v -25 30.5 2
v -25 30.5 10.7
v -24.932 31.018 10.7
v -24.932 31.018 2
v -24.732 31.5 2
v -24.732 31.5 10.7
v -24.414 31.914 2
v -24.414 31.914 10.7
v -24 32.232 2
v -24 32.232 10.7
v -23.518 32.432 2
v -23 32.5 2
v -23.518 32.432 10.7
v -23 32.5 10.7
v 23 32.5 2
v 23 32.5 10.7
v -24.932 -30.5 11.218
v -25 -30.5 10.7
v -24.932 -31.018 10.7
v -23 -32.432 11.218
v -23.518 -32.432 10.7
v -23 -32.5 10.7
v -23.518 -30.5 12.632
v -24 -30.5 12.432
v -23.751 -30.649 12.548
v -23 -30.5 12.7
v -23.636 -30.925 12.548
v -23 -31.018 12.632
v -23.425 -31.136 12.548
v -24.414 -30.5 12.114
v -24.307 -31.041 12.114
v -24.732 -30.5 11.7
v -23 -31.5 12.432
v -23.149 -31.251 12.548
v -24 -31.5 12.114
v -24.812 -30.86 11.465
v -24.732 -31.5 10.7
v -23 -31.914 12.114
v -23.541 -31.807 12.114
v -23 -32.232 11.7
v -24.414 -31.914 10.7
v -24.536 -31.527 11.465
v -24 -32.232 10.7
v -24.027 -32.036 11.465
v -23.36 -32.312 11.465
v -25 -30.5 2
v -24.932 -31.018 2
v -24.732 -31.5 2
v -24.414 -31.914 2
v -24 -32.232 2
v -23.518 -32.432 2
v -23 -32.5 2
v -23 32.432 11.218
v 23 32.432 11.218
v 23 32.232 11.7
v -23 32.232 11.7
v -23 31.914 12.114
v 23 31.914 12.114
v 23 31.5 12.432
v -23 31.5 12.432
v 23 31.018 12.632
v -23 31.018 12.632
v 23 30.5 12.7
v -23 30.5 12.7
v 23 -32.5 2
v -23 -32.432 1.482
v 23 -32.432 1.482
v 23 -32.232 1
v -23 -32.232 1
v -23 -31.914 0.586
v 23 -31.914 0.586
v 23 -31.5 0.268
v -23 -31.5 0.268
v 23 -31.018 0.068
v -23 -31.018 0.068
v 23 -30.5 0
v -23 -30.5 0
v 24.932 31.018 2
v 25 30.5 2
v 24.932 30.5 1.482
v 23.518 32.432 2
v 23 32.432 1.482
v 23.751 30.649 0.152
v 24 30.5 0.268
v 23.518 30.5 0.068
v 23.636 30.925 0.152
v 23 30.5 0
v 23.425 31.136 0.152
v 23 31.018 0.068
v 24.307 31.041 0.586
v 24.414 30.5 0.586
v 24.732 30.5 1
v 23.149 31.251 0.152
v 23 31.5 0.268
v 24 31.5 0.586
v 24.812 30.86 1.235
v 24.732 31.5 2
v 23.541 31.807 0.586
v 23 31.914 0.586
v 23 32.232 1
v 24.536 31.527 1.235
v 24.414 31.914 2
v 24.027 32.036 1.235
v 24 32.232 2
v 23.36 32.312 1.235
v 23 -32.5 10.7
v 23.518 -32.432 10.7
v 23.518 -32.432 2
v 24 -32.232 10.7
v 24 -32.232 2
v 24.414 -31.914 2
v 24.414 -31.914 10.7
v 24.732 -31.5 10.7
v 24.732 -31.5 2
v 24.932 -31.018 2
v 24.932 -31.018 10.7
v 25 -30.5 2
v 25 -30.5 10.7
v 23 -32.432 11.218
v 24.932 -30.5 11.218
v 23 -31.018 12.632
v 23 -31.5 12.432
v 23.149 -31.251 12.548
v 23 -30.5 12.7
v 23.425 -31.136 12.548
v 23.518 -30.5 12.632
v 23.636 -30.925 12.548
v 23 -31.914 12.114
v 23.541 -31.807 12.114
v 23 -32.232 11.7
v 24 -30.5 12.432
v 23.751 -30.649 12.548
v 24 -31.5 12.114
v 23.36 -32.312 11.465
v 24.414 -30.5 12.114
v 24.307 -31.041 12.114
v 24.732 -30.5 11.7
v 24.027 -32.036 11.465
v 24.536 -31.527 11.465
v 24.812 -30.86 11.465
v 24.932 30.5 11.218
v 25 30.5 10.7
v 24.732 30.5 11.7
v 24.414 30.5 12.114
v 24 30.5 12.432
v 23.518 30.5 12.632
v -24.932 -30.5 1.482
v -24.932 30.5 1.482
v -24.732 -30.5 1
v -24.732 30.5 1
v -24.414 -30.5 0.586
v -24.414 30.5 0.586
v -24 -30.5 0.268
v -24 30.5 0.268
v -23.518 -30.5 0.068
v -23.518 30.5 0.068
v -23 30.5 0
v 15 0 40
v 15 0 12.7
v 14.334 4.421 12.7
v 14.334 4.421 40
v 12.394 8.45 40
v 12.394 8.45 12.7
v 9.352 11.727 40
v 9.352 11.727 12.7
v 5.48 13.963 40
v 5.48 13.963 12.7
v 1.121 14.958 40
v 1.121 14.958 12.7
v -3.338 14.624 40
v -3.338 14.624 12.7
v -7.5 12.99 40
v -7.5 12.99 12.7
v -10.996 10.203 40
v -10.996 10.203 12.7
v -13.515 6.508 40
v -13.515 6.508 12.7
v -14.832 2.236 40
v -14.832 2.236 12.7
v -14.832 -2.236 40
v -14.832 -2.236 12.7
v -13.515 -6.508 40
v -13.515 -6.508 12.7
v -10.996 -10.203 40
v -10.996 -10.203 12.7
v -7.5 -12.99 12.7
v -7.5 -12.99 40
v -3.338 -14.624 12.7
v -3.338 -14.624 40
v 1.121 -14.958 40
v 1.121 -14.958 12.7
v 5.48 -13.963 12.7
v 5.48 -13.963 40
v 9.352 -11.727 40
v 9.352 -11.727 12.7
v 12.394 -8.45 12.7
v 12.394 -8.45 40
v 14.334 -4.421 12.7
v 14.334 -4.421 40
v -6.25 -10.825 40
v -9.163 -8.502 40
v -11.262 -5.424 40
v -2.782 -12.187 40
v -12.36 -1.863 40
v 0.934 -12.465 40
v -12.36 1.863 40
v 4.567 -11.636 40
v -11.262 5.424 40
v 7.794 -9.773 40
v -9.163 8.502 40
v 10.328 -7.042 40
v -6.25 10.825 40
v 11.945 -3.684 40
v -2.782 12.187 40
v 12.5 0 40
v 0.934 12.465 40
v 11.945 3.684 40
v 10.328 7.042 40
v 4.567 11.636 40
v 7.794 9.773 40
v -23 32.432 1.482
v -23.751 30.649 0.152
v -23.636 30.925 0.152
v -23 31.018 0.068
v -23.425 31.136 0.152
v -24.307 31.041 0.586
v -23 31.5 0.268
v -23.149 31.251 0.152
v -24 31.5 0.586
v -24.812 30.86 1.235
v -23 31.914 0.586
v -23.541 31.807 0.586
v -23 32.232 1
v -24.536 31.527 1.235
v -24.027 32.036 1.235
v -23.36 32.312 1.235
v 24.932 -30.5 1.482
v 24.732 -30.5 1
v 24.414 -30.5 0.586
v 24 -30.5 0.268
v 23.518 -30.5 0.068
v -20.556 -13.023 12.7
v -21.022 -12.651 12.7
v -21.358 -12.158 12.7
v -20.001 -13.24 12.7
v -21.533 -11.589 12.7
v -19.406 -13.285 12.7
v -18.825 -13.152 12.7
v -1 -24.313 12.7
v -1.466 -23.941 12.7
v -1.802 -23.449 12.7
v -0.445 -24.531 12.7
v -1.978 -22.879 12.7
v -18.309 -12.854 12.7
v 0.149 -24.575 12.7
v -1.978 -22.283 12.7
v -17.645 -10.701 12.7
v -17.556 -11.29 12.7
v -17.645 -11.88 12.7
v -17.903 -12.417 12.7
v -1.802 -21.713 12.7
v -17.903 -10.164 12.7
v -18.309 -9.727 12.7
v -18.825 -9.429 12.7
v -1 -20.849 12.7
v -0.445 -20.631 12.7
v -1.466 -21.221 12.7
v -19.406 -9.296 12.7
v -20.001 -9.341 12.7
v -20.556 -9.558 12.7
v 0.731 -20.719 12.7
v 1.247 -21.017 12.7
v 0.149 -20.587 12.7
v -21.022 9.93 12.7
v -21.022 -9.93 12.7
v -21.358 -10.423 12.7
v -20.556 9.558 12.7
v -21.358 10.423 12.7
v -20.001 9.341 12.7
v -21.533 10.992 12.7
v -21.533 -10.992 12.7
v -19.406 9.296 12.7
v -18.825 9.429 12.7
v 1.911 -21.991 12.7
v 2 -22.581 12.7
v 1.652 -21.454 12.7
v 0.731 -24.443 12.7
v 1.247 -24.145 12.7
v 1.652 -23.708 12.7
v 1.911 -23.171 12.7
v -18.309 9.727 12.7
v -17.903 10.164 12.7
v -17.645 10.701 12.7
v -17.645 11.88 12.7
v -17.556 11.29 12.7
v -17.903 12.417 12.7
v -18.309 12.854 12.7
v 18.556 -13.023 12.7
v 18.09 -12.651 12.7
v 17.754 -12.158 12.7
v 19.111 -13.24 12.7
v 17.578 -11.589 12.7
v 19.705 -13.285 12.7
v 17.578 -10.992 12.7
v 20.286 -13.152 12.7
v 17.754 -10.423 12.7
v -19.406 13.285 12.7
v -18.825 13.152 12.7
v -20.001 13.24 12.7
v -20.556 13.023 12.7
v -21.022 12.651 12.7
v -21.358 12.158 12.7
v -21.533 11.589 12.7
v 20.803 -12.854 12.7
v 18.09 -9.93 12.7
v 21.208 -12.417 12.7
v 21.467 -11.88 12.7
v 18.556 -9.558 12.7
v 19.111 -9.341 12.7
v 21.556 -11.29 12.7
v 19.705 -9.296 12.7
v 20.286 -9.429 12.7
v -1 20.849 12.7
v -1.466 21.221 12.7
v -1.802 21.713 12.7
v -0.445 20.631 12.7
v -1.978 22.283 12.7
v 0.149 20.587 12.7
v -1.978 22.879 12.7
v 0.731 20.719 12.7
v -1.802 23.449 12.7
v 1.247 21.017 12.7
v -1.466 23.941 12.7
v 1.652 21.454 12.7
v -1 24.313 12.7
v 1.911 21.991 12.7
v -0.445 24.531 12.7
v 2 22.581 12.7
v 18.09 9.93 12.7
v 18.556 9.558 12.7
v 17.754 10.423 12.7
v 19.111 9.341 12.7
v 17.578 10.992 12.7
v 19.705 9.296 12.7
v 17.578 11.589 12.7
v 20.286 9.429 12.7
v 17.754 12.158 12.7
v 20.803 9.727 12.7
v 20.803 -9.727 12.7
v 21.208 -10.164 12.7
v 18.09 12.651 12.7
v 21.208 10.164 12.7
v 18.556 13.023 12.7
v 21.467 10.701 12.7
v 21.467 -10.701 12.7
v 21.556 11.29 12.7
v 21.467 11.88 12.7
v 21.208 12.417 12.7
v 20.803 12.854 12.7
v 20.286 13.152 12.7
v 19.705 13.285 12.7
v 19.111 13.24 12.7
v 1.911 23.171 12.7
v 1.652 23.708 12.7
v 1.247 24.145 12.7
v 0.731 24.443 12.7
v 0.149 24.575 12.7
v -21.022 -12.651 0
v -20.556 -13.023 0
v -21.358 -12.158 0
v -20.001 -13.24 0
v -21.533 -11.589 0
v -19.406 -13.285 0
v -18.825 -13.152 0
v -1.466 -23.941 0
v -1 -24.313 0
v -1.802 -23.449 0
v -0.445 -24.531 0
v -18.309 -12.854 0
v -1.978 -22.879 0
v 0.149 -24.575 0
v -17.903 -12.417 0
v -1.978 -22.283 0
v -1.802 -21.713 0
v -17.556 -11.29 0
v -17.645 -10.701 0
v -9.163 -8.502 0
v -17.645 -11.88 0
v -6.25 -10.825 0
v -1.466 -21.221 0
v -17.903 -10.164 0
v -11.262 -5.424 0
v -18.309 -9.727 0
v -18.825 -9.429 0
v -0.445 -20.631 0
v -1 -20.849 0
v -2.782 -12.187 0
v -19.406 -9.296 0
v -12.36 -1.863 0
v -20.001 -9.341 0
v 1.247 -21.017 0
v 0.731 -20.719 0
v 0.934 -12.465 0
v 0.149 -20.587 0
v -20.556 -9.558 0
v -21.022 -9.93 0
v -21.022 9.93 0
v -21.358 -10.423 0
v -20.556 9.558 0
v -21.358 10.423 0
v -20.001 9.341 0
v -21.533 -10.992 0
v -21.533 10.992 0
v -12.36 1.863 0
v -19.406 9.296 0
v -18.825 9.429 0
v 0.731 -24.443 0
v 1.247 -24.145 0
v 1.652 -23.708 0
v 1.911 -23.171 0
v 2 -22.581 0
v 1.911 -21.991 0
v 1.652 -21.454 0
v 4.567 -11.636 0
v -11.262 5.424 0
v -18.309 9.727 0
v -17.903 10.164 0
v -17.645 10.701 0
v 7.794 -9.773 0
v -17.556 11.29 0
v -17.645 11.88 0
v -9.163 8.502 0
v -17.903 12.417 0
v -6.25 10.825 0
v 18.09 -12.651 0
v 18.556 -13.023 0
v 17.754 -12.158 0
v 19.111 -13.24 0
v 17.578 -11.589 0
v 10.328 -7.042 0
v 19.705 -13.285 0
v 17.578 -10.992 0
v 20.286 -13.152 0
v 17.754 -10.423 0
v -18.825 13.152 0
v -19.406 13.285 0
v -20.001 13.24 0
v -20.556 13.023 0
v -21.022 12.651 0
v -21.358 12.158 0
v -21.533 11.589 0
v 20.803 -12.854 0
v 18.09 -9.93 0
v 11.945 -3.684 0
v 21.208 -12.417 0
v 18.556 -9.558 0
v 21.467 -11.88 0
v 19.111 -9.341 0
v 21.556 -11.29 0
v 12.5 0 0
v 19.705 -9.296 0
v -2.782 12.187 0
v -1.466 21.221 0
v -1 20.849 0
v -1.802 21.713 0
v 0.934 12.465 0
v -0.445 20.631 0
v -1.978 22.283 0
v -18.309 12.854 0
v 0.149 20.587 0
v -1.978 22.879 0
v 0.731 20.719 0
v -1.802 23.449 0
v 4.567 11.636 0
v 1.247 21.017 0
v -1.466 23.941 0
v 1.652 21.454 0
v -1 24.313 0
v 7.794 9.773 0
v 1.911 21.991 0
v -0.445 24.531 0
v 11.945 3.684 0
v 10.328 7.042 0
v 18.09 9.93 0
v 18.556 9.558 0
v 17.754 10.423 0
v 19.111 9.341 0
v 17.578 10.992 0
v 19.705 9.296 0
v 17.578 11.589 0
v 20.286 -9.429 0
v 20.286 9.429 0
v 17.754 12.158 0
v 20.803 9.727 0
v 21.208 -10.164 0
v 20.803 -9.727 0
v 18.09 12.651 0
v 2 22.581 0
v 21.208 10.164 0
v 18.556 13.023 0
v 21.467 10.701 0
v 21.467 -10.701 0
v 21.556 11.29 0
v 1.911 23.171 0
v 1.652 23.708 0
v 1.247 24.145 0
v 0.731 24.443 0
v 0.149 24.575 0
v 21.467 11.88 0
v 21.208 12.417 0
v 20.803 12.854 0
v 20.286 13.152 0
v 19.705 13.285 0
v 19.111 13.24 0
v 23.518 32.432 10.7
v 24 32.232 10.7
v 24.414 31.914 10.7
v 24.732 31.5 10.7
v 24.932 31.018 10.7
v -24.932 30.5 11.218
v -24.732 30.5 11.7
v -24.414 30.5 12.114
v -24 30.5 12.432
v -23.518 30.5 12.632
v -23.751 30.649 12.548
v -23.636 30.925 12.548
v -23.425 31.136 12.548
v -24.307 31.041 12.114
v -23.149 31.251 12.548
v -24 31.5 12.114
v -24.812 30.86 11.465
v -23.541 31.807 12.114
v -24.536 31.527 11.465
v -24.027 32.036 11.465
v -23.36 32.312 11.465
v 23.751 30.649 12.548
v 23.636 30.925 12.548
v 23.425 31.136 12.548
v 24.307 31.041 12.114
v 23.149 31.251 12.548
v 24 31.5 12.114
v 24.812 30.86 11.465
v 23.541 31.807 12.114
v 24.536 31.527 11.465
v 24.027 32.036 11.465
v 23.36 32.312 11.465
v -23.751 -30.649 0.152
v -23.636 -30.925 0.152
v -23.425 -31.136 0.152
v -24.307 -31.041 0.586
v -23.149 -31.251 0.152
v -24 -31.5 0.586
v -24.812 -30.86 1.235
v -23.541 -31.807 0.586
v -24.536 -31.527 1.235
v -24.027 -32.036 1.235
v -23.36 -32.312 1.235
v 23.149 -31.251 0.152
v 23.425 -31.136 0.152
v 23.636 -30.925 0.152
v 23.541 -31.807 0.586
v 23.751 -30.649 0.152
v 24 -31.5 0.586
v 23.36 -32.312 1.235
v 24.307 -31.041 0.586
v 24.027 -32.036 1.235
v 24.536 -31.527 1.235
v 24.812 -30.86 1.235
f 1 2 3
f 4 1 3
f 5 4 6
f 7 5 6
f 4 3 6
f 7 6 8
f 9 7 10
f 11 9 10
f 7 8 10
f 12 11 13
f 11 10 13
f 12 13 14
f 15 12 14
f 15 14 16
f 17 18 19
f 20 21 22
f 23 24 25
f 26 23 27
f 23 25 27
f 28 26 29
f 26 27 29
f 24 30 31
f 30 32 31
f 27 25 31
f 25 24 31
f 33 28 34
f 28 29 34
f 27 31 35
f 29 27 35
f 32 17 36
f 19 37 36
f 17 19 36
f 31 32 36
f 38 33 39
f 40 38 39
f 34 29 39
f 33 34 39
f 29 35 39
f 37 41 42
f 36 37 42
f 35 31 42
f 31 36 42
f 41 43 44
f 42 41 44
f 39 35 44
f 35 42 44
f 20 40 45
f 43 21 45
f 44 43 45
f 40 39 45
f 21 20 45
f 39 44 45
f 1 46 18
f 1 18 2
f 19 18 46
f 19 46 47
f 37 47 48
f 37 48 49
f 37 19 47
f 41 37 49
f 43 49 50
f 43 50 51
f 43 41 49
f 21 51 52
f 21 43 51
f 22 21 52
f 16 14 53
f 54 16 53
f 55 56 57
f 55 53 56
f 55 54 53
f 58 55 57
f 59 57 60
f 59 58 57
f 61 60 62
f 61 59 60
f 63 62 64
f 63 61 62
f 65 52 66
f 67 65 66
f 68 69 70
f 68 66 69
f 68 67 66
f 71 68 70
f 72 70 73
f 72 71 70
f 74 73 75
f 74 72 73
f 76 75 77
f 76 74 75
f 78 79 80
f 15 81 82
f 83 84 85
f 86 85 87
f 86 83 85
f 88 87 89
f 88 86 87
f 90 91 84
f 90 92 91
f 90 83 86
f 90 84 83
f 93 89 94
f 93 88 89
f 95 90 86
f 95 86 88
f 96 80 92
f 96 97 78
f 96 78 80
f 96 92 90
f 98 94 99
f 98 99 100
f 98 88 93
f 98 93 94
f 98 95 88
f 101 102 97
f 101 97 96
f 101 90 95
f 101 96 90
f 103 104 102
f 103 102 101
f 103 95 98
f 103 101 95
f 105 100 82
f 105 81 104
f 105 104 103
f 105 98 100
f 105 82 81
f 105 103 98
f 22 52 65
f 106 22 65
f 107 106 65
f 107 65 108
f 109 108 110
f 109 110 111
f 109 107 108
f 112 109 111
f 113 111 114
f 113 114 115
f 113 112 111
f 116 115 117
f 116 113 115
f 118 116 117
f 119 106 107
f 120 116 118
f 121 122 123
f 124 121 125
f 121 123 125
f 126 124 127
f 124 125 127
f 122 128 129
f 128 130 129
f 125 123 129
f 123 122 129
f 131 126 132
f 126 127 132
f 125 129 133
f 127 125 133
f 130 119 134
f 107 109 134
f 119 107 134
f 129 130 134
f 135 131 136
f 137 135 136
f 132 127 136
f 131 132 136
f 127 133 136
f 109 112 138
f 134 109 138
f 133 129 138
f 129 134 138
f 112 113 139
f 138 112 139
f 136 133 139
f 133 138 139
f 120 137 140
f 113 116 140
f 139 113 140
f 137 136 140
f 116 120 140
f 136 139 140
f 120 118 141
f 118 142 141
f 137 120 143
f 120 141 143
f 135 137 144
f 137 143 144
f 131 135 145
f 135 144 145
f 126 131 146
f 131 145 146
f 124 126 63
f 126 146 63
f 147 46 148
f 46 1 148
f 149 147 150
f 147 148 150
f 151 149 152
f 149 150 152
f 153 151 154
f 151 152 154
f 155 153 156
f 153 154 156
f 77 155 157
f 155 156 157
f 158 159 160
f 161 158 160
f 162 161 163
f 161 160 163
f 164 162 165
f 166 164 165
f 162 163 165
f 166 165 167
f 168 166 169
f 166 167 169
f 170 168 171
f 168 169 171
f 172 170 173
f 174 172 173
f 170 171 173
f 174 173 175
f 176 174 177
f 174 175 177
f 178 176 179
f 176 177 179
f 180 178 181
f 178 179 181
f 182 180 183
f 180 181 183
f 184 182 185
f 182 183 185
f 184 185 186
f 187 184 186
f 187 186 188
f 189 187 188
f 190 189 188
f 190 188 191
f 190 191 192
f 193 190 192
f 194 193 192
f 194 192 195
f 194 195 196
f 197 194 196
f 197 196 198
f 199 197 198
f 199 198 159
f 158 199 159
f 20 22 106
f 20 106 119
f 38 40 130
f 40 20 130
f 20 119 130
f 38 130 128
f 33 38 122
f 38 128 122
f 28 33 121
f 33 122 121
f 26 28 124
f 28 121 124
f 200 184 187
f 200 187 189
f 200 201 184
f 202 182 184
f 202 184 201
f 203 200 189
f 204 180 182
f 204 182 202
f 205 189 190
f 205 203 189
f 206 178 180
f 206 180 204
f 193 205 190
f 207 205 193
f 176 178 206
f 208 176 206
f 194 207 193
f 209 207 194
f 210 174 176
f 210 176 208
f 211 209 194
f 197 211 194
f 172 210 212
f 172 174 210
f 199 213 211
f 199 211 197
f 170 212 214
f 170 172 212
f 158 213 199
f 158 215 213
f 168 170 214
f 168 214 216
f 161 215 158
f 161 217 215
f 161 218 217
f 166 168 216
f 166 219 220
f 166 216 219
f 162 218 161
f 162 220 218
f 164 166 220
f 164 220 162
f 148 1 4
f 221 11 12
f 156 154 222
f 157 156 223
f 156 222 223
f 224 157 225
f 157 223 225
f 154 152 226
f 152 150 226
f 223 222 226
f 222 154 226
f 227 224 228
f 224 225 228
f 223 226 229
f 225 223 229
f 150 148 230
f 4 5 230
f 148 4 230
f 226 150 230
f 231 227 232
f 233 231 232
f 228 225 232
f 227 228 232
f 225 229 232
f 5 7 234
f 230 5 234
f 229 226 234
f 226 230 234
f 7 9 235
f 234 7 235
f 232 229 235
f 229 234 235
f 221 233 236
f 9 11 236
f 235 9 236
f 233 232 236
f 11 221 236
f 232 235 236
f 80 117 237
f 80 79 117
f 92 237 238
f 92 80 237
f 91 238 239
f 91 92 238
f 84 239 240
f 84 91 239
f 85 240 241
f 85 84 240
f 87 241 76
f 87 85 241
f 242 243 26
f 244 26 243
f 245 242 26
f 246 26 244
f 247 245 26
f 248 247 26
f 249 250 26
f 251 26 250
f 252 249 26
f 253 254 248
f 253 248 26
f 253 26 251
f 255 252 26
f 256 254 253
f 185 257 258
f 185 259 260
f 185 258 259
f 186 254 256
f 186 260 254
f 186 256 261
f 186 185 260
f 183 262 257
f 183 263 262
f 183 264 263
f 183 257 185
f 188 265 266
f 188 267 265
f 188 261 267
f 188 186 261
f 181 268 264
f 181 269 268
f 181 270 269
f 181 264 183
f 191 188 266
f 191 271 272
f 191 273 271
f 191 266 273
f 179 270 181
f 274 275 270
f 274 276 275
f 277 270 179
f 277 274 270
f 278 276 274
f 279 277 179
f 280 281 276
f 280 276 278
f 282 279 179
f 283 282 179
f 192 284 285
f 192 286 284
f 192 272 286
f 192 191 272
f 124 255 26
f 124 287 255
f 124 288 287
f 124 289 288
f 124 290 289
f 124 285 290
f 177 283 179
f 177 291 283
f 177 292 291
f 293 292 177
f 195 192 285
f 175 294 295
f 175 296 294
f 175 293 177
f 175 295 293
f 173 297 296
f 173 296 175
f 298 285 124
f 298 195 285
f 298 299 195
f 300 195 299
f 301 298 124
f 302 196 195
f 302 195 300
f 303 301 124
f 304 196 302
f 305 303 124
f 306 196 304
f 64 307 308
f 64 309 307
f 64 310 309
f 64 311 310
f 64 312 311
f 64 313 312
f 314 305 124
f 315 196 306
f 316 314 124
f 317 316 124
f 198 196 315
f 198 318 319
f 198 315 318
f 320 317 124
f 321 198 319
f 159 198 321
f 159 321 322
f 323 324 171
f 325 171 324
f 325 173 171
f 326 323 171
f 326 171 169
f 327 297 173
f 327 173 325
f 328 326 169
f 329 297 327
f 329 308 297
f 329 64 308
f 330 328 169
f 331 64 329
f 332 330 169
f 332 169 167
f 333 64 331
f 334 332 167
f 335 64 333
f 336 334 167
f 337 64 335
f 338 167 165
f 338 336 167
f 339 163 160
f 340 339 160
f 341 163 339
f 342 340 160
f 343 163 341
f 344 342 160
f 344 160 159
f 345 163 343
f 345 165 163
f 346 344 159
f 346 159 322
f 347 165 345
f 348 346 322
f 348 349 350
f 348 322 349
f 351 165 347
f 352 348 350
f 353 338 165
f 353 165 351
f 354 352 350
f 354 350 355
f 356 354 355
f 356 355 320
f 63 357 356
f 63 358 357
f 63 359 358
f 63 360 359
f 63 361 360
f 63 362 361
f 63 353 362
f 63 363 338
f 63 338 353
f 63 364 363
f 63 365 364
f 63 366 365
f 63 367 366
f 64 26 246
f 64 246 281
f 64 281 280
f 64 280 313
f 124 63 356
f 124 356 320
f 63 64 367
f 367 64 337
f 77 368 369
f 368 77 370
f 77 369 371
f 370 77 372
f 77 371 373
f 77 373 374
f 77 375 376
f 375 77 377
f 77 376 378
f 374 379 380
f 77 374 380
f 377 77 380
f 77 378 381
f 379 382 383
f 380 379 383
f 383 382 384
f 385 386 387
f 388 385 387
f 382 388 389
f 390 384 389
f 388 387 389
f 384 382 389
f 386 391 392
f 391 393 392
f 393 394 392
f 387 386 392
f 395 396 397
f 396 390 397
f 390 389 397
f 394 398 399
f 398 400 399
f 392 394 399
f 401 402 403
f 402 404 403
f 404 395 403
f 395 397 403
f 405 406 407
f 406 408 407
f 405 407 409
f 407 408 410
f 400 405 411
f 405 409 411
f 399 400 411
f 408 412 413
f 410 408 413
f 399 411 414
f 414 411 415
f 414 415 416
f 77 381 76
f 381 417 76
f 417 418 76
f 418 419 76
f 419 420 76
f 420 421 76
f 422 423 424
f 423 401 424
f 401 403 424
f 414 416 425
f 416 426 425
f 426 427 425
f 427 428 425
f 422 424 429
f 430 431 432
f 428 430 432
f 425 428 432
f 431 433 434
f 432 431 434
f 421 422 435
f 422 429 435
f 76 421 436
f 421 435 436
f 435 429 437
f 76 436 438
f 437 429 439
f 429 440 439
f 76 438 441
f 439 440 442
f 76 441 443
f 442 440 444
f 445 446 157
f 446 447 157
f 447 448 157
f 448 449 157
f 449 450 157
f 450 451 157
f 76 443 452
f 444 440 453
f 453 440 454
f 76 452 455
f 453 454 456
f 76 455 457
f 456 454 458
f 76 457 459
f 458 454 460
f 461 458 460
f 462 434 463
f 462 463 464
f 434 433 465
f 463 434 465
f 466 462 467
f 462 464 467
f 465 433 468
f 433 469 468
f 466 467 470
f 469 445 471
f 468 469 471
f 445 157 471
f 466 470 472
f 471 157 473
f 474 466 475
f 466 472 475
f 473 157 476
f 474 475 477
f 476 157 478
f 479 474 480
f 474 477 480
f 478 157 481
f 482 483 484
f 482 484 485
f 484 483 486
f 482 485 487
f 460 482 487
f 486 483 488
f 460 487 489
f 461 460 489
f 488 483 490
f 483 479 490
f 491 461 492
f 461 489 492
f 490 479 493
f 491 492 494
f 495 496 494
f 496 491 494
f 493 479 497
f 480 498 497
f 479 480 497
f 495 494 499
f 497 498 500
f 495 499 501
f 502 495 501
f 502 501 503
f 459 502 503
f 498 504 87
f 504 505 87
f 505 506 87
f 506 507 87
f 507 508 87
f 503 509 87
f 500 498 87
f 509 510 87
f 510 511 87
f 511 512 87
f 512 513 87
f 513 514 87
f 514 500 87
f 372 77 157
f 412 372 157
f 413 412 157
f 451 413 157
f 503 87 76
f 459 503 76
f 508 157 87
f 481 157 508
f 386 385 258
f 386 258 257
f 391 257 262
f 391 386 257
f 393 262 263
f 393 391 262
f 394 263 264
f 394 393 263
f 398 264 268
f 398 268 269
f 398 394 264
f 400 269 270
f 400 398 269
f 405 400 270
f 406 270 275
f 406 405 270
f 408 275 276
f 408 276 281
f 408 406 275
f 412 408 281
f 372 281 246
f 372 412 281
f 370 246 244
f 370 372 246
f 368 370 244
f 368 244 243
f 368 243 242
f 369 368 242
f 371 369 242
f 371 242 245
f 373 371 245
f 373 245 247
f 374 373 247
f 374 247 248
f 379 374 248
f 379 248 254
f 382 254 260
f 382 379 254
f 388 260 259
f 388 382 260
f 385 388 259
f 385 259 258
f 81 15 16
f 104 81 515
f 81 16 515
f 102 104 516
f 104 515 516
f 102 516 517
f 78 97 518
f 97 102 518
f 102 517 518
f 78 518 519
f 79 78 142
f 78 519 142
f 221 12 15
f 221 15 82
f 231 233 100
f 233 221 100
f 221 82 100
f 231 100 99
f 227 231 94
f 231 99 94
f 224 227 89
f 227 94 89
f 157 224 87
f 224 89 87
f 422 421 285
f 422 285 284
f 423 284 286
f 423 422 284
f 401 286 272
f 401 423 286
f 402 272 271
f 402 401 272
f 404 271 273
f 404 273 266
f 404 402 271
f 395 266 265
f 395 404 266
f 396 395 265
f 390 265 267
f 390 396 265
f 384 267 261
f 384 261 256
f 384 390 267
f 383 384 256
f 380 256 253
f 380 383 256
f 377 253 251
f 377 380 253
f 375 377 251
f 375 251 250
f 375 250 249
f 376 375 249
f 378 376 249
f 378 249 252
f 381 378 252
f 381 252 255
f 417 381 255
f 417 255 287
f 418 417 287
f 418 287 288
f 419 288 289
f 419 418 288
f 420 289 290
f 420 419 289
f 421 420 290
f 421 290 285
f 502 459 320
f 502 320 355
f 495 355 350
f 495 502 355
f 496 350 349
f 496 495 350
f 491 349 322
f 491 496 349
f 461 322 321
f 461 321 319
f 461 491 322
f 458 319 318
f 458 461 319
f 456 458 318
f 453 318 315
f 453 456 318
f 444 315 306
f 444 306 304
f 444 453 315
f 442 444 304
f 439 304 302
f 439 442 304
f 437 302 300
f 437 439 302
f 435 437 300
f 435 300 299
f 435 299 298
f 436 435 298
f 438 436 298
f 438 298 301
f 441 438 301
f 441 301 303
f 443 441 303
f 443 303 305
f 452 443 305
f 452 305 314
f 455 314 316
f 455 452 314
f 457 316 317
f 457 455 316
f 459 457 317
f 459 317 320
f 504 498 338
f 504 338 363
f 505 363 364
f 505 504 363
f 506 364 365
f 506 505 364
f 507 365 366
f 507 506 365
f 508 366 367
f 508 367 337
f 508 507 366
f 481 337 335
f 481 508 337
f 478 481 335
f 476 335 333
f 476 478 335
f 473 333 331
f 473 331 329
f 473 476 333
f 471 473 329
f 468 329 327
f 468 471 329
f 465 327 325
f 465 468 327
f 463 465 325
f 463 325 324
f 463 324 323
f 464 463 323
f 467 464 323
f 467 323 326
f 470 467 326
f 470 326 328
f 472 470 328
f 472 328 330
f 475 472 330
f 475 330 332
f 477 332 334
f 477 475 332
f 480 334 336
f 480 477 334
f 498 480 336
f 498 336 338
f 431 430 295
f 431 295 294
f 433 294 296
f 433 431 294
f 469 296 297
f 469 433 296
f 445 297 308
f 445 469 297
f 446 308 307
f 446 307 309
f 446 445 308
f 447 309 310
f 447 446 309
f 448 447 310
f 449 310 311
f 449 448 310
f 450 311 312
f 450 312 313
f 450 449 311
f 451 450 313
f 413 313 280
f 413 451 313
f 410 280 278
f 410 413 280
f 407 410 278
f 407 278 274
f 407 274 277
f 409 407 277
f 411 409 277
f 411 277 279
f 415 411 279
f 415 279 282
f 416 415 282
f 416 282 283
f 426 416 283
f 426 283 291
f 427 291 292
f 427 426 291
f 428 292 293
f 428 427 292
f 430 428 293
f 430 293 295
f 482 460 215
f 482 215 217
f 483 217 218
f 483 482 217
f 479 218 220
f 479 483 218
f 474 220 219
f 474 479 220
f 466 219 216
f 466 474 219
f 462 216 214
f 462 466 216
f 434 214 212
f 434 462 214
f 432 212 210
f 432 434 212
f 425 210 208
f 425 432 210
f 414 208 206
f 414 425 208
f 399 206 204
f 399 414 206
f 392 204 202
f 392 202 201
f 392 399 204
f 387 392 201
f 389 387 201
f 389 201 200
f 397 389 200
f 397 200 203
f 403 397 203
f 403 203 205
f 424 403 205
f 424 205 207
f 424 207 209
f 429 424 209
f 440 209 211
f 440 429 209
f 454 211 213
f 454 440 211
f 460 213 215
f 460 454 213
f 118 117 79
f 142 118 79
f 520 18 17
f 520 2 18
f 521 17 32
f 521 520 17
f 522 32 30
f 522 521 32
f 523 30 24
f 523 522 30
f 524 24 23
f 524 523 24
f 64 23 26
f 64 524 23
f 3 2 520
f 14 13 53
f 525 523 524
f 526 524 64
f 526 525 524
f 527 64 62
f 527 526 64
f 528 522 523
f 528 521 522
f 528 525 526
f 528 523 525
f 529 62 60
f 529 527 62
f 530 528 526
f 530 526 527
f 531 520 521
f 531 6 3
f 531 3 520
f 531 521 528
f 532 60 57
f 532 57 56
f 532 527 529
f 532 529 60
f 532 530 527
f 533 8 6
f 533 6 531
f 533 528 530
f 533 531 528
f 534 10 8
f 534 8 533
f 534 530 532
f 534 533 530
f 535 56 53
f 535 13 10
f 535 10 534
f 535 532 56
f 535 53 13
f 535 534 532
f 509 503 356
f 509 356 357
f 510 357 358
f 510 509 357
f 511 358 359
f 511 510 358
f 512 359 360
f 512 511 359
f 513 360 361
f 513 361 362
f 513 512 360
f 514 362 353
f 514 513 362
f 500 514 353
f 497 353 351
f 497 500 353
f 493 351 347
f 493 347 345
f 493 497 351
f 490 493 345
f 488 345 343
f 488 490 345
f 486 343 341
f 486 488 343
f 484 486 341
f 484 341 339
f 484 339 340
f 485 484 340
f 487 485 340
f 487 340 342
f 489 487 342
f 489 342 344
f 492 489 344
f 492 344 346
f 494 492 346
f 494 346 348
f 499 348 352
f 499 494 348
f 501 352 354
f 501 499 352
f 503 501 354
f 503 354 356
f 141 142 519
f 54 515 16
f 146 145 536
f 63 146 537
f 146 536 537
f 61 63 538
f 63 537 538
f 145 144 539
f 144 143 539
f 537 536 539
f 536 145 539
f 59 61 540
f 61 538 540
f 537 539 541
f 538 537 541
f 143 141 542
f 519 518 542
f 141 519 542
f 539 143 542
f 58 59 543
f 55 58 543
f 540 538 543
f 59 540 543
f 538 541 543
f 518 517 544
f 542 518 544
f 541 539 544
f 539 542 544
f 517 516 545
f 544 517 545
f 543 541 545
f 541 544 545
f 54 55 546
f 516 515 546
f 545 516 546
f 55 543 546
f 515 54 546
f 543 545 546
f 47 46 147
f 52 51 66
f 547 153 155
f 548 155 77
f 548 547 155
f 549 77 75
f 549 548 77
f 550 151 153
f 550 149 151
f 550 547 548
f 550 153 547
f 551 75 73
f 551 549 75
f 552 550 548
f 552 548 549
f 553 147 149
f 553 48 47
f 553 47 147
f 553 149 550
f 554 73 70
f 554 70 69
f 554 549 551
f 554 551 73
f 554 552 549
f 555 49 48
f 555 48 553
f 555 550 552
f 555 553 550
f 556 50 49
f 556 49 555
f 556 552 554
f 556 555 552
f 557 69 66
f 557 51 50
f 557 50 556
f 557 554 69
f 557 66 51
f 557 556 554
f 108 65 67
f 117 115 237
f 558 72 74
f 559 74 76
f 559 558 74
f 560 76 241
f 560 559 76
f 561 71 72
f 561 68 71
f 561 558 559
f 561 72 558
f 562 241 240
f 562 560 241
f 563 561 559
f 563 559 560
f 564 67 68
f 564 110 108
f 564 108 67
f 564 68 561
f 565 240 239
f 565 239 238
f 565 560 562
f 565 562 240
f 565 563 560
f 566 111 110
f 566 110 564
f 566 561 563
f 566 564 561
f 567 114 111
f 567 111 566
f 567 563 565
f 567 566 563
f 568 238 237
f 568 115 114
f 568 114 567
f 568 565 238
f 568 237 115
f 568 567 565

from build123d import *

# Parameters (mm, degrees)
F0_W     = 50
F0_H     = 65
F0_R     = 2
F0_R_2   = 15
F1_DEPTH = 12.7
F2_R     = 2
F0_R_3   = 12.5
F3_DEPTH = 40


with BuildPart() as f1:
    # F0 (on Top) → F1 (new body)
    with BuildSketch(Plane.XY):
        Rectangle(F0_W, F0_H)
        with Locations((-19.55572, -11.2905)):
            Circle(F0_R, mode=Mode.SUBTRACT)
        with Locations((0, -22.581)):
            Circle(F0_R, mode=Mode.SUBTRACT)
        with Locations((19.55572, -11.2905)):
            Circle(F0_R, mode=Mode.SUBTRACT)
        with Locations((-19.55572, 11.2905)):
            Circle(F0_R, mode=Mode.SUBTRACT)
        Circle(F0_R_2, mode=Mode.SUBTRACT)
        with Locations((19.55572, 11.2905)):
            Circle(F0_R, mode=Mode.SUBTRACT)
        with Locations((0, 22.581)):
            Circle(F0_R, mode=Mode.SUBTRACT)
    extrude(amount=F1_DEPTH)

    # F2
    f2_edges = [f1.edges().sort_by_distance(p)[0] for p in [
        (-25, 32.5, 6.35),
        (-25, -32.5, 6.35),
        (-25, 0, 0),
        (-25, 0, 12.7),
        (25, -32.5, 6.35),
        (0, -32.5, 0),
        (0, -32.5, 12.7),
        (25, 32.5, 6.35),
        (25, 0, 0),
        (25, 0, 12.7),
        (0, 32.5, 0),
        (0, 32.5, 12.7),
    ]]
    fillet(f2_edges, radius=F2_R)

    # F0 (on Top) → F3 (join)
    with BuildSketch(Plane.XY):
        Circle(F0_R_2)
        Circle(F0_R_3, mode=Mode.SUBTRACT)
    extrude(amount=F3_DEPTH)


solid = f1.part
